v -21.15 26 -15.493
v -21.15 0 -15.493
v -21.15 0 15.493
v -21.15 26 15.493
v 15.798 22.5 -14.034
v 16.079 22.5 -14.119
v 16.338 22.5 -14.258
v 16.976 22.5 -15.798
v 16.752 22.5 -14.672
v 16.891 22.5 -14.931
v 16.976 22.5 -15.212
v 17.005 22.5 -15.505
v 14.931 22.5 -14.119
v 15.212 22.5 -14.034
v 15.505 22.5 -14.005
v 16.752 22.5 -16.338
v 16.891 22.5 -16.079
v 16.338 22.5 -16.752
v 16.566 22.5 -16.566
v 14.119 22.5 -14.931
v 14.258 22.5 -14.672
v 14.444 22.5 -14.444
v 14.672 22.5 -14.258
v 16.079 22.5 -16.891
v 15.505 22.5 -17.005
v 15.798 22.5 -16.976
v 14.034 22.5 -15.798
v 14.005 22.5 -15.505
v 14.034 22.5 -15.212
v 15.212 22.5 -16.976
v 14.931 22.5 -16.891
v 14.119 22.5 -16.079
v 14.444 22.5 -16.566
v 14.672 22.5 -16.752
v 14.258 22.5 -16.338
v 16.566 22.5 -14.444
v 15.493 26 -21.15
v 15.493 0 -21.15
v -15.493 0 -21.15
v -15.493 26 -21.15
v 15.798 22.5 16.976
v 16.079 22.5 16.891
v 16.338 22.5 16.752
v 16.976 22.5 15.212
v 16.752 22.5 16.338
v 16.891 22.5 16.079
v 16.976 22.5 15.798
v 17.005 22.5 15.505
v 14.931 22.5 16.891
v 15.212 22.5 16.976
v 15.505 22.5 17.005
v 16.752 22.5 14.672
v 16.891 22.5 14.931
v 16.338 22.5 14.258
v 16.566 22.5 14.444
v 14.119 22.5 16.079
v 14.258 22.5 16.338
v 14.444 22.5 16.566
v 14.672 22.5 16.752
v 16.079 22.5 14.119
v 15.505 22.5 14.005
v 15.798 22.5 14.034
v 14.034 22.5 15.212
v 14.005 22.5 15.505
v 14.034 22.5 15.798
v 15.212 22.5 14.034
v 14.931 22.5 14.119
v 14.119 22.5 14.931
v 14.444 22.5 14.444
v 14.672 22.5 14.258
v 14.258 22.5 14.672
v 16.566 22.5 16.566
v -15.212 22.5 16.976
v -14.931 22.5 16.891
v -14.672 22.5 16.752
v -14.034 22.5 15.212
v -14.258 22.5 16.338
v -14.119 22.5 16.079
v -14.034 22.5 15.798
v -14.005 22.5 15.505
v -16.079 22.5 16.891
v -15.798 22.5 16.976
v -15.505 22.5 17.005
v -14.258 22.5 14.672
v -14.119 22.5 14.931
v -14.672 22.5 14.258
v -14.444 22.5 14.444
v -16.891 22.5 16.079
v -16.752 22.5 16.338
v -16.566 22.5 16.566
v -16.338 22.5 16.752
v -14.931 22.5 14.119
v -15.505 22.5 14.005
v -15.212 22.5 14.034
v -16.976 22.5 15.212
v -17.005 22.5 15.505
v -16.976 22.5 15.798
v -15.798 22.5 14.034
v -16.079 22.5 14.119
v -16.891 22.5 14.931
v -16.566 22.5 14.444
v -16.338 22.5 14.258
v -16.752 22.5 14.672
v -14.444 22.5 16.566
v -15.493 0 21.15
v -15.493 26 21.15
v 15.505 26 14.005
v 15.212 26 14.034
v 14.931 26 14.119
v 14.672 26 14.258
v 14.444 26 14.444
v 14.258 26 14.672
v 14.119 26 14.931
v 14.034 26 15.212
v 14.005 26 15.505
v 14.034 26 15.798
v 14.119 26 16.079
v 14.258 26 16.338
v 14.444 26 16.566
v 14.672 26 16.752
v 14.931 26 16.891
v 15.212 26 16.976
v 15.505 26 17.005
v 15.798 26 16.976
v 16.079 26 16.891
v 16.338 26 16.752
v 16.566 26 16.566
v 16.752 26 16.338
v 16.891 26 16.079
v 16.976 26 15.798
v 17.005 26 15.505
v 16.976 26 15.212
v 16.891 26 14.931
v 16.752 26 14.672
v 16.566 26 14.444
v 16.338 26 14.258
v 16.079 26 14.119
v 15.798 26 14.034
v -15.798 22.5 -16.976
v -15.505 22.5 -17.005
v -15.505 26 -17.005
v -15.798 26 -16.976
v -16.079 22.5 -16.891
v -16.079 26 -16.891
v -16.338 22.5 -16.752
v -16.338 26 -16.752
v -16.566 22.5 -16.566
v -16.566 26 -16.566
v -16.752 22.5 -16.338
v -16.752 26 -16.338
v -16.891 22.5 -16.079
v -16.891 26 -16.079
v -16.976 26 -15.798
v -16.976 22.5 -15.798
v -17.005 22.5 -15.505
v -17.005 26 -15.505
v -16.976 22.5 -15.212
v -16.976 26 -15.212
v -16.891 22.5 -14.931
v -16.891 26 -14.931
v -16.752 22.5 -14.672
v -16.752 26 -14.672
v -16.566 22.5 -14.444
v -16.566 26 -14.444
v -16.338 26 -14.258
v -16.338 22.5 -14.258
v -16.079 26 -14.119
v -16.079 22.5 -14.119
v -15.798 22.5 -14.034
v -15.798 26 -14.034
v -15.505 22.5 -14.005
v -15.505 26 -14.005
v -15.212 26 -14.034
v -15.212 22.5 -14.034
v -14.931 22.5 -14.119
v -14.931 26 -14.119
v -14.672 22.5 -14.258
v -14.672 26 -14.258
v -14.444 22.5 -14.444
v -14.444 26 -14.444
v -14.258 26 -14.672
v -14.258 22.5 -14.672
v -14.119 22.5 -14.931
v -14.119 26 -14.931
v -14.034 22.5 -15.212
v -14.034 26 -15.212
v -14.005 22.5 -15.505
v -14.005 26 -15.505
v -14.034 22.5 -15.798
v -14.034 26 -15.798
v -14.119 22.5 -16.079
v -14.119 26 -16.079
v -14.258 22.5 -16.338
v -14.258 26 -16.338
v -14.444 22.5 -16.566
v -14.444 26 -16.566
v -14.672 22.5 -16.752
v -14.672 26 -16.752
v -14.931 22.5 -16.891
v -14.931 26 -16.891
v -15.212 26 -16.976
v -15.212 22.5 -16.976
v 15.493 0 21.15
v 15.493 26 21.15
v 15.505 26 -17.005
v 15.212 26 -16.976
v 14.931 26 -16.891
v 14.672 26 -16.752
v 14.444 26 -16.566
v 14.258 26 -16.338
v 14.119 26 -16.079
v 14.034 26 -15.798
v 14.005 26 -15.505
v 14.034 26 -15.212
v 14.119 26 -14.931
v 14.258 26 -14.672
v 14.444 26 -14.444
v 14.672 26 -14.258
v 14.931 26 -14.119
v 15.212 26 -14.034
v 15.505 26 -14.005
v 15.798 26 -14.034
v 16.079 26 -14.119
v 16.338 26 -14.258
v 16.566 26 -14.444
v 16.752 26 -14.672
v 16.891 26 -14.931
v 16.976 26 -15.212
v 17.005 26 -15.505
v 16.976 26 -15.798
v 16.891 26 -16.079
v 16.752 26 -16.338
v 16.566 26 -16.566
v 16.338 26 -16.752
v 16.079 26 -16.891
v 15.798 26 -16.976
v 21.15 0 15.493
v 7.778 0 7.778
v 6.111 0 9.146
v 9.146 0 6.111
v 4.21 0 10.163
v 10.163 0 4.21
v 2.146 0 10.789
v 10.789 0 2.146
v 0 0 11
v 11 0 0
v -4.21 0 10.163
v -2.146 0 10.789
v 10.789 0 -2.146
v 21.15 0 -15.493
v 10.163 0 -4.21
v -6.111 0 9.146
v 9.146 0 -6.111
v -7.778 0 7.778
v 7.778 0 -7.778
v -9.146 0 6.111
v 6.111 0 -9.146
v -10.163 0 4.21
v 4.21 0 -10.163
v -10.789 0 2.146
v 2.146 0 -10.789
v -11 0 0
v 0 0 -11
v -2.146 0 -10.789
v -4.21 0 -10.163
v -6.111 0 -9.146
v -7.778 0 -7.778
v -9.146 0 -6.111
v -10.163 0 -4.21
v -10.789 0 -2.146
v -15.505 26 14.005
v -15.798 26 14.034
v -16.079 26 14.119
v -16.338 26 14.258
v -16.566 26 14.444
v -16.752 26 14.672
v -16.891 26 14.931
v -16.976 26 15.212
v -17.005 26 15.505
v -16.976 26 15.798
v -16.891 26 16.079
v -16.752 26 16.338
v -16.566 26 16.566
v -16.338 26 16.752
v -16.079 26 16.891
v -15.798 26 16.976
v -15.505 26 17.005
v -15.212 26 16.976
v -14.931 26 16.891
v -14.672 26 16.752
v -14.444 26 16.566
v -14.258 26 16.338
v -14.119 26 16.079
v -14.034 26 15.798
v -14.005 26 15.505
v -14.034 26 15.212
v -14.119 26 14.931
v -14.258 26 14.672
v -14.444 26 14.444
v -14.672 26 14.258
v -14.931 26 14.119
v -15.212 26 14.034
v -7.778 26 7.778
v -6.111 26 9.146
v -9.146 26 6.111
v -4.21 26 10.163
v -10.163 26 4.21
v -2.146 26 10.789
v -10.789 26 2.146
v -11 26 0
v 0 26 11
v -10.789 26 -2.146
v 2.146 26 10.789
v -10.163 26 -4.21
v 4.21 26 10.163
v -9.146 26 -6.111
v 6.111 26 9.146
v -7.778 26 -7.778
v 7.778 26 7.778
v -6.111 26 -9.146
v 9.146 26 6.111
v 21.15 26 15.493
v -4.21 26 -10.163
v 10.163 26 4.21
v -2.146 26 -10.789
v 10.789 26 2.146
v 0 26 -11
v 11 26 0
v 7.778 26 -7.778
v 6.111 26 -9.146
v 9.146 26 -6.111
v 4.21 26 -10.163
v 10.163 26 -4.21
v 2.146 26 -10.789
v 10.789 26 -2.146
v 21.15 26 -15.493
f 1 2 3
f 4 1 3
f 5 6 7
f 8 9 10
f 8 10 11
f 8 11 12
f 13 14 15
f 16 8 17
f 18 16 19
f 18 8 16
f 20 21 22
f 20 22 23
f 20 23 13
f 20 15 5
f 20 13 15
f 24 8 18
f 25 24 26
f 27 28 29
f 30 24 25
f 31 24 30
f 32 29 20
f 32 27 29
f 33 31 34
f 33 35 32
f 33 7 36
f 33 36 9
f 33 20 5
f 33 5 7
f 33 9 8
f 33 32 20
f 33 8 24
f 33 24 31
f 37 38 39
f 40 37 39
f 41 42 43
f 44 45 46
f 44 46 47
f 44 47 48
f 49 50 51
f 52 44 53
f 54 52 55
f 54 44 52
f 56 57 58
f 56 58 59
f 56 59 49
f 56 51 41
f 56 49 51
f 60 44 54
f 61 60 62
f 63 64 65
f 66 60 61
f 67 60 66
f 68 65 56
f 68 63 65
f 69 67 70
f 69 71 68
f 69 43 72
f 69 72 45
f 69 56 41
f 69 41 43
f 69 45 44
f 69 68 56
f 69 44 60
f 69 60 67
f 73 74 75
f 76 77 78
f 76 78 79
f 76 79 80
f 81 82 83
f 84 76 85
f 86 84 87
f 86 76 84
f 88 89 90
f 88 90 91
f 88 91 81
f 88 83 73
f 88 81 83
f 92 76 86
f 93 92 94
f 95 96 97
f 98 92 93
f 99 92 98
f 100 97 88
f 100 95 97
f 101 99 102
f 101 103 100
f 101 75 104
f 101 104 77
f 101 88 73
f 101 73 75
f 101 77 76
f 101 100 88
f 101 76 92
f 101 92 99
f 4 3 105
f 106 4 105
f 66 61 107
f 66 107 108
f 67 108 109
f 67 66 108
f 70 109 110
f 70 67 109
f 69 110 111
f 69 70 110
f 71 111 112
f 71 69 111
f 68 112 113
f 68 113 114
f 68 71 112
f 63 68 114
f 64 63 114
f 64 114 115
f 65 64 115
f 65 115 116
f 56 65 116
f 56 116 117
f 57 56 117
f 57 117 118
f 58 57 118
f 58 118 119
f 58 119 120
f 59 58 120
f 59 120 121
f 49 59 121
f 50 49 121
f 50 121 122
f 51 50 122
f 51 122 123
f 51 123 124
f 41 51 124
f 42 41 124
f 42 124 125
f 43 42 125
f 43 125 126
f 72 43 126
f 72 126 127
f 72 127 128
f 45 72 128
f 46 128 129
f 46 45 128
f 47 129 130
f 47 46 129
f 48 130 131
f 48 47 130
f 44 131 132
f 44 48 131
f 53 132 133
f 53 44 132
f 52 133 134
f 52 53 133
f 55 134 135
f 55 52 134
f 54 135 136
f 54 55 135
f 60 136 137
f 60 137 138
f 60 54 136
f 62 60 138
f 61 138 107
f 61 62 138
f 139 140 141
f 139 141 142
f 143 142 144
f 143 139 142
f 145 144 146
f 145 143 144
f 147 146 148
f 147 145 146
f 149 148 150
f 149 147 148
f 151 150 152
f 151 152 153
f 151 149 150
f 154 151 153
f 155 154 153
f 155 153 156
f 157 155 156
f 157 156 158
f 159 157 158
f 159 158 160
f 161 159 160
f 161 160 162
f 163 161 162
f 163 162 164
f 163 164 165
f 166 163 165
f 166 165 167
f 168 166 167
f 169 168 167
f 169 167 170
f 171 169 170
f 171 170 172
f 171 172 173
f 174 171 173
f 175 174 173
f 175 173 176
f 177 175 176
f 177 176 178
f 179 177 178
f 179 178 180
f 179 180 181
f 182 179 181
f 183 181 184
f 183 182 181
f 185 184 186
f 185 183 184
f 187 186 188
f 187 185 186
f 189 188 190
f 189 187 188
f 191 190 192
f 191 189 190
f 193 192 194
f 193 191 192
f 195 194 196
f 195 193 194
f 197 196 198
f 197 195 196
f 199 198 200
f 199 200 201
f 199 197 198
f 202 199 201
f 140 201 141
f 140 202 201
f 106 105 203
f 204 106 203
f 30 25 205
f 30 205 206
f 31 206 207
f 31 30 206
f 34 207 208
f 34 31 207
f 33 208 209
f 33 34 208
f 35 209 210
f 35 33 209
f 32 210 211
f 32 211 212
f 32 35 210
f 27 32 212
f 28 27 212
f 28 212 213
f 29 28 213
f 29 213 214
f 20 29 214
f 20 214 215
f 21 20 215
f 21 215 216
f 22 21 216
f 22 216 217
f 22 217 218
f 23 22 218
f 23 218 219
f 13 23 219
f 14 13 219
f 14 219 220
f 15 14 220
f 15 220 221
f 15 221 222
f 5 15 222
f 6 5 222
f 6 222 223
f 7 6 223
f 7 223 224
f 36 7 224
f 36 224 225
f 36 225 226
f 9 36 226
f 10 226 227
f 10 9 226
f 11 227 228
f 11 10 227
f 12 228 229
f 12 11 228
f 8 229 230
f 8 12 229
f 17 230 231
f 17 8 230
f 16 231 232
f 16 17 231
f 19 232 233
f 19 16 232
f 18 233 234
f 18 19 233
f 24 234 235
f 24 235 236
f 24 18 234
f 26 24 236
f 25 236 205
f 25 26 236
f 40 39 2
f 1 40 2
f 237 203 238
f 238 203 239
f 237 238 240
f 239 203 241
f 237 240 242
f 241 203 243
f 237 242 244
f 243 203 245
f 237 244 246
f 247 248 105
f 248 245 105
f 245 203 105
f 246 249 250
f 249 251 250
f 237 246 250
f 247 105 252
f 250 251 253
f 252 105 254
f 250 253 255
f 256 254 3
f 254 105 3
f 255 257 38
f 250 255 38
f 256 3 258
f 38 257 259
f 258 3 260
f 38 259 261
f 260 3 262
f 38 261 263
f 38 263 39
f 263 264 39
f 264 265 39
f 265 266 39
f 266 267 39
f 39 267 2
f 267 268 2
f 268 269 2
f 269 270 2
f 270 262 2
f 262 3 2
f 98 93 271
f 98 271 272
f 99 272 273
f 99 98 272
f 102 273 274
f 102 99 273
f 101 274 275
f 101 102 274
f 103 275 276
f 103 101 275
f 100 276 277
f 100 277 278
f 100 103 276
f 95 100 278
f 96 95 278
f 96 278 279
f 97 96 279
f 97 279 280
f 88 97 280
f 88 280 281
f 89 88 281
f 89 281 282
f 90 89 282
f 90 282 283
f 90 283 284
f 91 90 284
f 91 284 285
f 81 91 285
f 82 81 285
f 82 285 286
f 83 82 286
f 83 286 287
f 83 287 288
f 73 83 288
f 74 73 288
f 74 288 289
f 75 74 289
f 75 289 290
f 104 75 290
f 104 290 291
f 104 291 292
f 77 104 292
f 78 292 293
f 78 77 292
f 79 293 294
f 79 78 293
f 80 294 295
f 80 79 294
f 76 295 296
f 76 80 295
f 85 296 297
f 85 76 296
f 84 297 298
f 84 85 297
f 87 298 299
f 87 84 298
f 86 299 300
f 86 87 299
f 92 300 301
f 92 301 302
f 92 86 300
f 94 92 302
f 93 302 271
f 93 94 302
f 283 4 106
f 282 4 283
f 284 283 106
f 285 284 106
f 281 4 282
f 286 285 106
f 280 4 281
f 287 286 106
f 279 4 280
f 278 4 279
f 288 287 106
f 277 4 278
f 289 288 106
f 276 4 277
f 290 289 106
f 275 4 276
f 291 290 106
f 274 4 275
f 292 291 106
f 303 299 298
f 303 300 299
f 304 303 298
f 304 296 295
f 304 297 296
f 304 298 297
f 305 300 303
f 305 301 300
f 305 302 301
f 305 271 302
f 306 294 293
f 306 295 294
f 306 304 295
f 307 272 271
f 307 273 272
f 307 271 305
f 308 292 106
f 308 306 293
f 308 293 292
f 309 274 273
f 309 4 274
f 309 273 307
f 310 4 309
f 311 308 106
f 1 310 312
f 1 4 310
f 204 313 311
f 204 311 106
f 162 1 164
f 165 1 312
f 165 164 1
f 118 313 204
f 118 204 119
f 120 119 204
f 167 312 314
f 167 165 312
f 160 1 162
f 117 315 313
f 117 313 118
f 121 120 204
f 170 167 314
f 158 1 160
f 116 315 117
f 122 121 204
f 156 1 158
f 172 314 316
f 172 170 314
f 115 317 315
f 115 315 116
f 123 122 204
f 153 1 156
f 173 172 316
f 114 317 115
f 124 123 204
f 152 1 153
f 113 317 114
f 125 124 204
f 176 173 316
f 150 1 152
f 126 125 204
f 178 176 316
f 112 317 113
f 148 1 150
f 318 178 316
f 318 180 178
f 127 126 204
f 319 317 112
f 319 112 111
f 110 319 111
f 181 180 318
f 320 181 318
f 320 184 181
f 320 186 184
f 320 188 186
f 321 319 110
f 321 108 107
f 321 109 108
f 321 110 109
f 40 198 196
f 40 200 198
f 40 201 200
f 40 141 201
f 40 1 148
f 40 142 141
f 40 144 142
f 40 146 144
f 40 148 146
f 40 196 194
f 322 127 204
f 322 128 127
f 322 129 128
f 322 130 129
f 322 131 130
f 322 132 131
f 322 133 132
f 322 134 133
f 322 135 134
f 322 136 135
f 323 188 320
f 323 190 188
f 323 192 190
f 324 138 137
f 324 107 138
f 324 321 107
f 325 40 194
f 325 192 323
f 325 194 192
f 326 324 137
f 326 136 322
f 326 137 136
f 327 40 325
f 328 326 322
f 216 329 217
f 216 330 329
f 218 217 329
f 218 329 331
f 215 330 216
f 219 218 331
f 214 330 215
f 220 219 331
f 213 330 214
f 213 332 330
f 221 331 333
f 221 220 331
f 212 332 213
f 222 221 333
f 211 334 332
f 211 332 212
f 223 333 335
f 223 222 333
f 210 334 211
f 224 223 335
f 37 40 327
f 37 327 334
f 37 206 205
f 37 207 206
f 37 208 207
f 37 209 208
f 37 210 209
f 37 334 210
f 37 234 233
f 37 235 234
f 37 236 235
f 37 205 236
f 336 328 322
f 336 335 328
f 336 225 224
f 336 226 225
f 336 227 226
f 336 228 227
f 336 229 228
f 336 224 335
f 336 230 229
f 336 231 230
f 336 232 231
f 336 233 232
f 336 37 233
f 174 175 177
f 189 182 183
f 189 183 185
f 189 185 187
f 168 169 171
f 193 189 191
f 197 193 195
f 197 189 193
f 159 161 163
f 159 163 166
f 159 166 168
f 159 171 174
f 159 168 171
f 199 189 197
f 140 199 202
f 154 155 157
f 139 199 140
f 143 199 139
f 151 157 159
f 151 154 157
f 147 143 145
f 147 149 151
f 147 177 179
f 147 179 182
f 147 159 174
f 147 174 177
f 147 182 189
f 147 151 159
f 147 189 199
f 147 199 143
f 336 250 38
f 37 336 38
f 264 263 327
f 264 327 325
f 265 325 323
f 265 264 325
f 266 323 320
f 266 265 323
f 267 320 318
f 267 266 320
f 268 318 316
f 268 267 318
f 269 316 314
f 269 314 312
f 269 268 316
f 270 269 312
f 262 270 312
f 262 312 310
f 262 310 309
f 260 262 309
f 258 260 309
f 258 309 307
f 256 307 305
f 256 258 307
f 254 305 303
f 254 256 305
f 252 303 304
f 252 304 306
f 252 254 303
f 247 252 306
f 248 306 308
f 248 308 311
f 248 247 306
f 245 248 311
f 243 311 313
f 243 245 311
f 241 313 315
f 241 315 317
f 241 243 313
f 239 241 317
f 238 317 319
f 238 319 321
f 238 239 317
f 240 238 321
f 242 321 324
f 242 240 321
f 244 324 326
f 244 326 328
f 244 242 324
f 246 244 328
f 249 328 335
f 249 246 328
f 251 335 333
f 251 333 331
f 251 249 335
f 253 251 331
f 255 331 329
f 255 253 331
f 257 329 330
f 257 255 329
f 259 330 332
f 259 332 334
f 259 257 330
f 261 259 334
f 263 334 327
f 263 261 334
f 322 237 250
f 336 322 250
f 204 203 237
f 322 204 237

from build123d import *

# Parameters (mm, degrees)
SKETCH1_R           = 1.5
SKETCH1_R_2         = 11
BOSS_EXTRUDE1_DEPTH = 26
SKETCH1_3_R         = 1.5
BOSS_EXTRUDE2_DEPTH = 22.5


with BuildPart() as part:
    # Sketch1 → Boss-Extrude1 (new body)
    with BuildSketch(Plane(origin=(0, 0, 0), x_dir=(1, 0, 0), z_dir=(0, 1, 0))):
        Polygon((-15.493145751, 21.15), (-21.15, 15.493145751), (-21.15, -15.493145751), (-15.493145751, -21.15), (15.493145751, -21.15), (21.15, -15.493145751), (21.15, 15.493145751), (15.493145751, 21.15), align=None)
        with Locations(Location((-15.505, -15.505, 0), (0, 0, 90))):
            Circle(SKETCH1_R, mode=Mode.SUBTRACT)
        with Locations(Location((15.505, -15.505, 0), (0, 0, 90))):
            Circle(SKETCH1_R, mode=Mode.SUBTRACT)
        with Locations(Location((0, 0, 0), (0, 0, 90))):
            Circle(SKETCH1_R_2, mode=Mode.SUBTRACT)
        with Locations(Location((-15.505, 15.505, 0), (0, 0, 90))):
            Circle(SKETCH1_R, mode=Mode.SUBTRACT)
        with Locations(Location((15.505, 15.505, 0), (0, 0, 90))):
            Circle(SKETCH1_R, mode=Mode.SUBTRACT)
    extrude(amount=BOSS_EXTRUDE1_DEPTH)

    # Sketch1<3> → Boss-Extrude2 (add)
    with BuildSketch(Plane(origin=(0, 0, 0), x_dir=(1, 0, 0), z_dir=(0, 1, 0))):
        with Locations(Location((15.505, -15.505, 0), (0, 0, 90))):
            Circle(SKETCH1_3_R)
        with Locations(Location((-15.505, -15.505, 0), (0, 0, 90))):
            Circle(SKETCH1_3_R)
        with Locations(Location((15.505, 15.505, 0), (0, 0, 90))):
            Circle(SKETCH1_3_R)
        with Locations(Location((-15.505, 15.505, 0), (0, 0, 90))):
            Circle(SKETCH1_3_R)
    extrude(amount=BOSS_EXTRUDE2_DEPTH)


solid = part.part
